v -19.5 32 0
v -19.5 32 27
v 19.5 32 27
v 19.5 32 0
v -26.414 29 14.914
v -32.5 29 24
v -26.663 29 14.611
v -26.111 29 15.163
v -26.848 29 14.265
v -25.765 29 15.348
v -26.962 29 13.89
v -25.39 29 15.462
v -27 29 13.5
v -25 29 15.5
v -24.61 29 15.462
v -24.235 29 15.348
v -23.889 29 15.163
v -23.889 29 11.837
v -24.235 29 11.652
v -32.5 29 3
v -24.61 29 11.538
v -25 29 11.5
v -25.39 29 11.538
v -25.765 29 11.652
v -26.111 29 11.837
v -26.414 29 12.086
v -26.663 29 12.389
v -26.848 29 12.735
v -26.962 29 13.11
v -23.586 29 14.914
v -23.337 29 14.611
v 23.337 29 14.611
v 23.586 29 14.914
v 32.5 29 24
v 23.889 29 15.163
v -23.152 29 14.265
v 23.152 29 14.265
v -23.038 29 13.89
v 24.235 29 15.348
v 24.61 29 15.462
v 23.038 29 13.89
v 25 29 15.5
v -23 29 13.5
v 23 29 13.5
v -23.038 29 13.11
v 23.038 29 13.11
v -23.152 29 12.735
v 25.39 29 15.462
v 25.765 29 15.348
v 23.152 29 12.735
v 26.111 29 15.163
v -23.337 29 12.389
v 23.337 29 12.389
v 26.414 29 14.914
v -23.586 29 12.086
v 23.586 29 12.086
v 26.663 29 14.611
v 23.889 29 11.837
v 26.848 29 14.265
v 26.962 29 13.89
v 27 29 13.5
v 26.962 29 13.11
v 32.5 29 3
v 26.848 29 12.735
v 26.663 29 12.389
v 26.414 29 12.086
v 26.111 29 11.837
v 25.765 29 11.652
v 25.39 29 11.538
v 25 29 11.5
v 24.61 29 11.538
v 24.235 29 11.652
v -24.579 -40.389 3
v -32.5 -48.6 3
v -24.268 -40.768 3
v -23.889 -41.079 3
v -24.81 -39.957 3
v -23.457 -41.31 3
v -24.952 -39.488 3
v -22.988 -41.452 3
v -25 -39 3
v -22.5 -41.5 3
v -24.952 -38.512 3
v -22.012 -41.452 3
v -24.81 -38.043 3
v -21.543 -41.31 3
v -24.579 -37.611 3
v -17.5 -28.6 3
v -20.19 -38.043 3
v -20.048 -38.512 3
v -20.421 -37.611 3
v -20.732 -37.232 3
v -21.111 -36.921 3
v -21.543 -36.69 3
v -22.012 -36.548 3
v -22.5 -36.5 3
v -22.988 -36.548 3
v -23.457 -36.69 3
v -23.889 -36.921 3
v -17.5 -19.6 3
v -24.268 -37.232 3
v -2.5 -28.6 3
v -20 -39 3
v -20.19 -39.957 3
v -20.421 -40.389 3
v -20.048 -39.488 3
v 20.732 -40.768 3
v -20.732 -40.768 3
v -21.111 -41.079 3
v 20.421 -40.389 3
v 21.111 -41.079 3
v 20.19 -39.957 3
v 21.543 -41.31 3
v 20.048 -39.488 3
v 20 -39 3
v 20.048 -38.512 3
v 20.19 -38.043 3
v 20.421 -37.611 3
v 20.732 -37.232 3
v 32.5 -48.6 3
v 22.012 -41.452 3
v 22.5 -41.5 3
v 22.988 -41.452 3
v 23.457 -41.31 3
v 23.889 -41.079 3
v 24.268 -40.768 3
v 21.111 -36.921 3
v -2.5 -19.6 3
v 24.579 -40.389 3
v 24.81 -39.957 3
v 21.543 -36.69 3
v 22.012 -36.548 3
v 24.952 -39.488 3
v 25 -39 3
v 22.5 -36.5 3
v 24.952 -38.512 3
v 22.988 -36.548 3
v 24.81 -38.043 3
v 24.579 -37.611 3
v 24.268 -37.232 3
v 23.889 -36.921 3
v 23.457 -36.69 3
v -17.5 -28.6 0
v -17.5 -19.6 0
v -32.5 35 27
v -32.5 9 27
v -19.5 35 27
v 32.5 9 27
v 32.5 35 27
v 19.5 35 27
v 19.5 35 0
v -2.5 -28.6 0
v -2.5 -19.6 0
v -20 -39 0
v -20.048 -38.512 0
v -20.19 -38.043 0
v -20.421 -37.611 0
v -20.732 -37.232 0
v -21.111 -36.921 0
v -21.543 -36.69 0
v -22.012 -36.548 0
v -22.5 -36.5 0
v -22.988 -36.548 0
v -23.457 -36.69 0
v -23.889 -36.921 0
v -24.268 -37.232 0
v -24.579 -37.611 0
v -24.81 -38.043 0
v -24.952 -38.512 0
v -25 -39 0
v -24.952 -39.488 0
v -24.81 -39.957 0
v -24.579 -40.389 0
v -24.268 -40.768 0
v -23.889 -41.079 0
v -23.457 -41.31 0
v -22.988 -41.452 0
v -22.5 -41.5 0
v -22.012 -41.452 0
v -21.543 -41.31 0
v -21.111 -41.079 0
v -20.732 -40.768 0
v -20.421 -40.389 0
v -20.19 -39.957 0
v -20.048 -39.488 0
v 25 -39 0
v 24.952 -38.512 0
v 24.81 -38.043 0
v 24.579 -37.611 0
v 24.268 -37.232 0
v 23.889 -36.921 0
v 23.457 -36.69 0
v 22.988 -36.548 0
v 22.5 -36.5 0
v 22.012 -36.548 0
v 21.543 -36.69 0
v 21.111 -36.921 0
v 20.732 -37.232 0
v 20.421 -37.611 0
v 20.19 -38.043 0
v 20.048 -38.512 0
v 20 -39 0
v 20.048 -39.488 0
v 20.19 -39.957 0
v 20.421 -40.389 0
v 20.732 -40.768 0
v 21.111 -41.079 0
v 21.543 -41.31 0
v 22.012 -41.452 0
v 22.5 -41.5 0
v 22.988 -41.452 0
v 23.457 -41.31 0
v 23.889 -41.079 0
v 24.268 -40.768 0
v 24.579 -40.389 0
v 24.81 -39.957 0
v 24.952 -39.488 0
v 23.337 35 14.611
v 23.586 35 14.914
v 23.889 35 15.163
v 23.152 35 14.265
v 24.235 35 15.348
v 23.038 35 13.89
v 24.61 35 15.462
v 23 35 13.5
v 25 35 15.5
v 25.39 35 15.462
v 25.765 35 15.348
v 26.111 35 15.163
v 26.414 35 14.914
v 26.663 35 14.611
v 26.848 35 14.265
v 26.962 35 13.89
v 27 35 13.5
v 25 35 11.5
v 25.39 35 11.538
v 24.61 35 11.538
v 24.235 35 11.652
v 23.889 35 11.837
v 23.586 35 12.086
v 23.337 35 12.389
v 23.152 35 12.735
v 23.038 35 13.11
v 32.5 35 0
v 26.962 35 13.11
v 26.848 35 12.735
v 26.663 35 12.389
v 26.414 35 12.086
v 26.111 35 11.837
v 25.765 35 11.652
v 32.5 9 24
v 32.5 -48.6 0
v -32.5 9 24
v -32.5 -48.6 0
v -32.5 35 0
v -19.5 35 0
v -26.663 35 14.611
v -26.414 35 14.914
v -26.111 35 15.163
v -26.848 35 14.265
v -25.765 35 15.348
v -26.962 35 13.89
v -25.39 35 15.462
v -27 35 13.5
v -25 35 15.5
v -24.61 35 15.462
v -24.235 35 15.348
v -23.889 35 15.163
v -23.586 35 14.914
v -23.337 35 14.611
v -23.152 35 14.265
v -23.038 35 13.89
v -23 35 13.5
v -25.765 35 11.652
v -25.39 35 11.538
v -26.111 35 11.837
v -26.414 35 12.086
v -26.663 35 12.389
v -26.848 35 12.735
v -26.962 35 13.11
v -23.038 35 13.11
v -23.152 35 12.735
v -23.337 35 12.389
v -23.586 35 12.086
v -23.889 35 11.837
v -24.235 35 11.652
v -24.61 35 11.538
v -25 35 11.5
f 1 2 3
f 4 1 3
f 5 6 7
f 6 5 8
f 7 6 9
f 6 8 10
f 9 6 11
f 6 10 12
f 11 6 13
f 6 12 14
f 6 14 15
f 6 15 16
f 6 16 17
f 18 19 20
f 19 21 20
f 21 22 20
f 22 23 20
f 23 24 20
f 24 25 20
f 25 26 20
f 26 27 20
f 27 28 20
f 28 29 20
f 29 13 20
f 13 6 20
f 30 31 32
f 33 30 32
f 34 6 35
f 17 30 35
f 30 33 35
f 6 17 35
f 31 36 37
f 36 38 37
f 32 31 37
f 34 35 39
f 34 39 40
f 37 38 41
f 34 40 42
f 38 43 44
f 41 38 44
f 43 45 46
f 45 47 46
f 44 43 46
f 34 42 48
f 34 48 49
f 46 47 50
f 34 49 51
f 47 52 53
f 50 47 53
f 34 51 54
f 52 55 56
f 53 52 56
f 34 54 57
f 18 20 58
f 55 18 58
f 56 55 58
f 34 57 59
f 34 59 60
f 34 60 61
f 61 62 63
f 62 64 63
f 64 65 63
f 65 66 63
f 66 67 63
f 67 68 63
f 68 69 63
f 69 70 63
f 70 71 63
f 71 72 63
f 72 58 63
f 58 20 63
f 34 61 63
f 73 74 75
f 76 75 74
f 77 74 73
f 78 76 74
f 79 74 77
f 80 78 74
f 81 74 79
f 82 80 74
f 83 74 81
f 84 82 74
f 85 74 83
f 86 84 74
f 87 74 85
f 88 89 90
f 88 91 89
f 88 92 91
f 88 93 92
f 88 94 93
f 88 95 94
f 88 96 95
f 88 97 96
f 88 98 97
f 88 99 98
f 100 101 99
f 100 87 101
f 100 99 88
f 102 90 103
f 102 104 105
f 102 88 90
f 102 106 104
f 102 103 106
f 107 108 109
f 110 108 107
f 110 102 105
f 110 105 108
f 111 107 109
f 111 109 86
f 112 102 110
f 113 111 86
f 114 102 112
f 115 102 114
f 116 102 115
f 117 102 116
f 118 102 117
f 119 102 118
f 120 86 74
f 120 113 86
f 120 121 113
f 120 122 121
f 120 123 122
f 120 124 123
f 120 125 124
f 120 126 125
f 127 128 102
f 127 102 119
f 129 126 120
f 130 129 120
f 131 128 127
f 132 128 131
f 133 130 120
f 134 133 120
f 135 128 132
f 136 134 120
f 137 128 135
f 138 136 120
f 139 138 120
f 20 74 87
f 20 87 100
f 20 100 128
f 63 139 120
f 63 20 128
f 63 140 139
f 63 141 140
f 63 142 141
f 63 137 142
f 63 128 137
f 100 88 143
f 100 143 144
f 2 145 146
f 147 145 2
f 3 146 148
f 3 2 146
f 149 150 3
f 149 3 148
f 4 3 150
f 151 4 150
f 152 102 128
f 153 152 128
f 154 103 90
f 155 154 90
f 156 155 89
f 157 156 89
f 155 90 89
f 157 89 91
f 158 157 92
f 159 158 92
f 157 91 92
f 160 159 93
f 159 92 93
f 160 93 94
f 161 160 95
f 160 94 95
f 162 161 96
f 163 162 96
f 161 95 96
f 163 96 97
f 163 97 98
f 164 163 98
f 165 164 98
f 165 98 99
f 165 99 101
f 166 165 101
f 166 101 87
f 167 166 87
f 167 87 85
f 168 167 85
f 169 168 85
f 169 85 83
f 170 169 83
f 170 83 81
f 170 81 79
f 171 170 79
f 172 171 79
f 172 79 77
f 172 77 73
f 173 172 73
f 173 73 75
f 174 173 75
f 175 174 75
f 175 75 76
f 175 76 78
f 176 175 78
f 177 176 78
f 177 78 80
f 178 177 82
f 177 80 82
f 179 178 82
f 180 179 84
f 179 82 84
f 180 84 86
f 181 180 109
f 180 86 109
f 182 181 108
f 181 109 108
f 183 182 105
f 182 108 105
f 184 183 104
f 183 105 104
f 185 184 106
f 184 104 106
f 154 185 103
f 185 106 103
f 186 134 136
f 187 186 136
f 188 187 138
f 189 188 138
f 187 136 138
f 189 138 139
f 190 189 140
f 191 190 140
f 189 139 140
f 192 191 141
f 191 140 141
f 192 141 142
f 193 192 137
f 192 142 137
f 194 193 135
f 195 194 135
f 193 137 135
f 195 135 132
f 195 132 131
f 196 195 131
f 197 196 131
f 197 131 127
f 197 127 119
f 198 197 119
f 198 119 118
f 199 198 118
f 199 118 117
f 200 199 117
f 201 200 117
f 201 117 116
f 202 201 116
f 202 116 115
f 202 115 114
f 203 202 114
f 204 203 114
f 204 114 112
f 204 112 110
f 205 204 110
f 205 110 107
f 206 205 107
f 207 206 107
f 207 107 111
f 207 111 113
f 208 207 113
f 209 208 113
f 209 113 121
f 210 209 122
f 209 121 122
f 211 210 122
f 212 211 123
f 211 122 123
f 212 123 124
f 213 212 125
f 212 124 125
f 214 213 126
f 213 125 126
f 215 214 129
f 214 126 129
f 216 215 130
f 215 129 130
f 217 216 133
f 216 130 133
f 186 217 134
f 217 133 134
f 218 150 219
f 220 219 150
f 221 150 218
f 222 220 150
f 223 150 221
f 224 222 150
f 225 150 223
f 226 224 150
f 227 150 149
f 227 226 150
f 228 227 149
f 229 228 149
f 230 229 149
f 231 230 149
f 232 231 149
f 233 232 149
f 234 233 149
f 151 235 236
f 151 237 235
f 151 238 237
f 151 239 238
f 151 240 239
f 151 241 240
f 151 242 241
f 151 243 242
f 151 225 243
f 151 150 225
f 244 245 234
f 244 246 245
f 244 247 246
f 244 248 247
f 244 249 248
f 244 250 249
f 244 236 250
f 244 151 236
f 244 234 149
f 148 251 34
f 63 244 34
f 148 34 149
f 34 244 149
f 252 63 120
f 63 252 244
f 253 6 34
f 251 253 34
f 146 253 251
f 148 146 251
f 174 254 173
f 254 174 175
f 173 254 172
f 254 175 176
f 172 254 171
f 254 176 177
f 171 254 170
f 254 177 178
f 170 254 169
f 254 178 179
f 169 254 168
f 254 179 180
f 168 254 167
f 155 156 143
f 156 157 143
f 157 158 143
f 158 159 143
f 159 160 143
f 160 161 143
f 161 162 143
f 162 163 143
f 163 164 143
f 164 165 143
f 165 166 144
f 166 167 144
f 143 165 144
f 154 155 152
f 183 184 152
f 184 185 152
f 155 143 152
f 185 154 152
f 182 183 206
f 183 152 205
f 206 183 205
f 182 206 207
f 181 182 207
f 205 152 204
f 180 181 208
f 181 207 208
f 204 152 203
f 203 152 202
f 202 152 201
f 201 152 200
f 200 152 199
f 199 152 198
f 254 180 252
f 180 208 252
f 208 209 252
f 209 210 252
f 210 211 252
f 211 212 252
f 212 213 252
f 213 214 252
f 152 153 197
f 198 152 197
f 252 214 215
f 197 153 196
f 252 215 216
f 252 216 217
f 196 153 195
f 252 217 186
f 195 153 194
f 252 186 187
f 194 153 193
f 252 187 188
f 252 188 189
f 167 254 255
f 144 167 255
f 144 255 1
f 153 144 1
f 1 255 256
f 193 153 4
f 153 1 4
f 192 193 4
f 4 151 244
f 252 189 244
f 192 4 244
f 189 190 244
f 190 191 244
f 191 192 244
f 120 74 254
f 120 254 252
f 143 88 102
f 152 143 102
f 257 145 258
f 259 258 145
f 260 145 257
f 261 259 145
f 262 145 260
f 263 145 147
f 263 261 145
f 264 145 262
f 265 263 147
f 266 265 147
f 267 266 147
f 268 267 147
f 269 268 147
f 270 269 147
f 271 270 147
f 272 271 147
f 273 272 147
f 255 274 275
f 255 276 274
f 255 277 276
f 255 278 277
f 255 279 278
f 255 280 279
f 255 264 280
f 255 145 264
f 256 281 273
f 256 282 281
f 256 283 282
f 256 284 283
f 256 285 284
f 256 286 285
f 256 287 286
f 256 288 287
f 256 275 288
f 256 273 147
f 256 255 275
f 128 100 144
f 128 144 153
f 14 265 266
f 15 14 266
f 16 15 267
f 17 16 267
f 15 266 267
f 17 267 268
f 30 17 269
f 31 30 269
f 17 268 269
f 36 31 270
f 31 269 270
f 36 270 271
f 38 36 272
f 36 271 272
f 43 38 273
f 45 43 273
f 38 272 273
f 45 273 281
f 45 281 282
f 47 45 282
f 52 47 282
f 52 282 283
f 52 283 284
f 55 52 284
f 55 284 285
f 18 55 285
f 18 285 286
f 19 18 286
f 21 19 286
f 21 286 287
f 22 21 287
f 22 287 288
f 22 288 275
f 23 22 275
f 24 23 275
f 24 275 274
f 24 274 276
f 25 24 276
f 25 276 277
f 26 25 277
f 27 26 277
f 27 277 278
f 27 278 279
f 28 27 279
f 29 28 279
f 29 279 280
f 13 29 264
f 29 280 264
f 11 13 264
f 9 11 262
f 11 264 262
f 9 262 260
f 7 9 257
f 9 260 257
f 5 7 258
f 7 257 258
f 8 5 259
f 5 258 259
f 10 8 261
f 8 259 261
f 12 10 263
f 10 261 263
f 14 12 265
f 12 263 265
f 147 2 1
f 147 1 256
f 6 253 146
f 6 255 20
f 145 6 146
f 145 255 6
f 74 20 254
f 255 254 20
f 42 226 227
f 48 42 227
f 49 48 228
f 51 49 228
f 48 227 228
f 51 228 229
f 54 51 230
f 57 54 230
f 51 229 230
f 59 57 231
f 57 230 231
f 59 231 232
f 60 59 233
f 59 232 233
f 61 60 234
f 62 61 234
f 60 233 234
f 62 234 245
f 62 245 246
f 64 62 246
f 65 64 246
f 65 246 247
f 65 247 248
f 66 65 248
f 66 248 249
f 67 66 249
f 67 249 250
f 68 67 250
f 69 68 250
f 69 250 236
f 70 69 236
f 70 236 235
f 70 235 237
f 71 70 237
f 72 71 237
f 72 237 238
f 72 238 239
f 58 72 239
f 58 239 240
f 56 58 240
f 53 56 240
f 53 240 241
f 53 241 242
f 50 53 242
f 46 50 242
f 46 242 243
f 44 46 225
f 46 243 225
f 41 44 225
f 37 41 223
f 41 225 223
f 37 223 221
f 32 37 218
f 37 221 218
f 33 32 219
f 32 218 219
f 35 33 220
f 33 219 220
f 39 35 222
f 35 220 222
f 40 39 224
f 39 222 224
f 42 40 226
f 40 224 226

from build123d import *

# Parameters (mm, degrees)
SKETCH_1_W          = 65
SKETCH_1_H          = 70
EXTRUDE_1_DEPTH     = 3
SKETCH_2_W          = 65
SKETCH_2_H          = 6
EXTRUDE_2_DEPTH     = 21
SKETCH_3_W          = 65
SKETCH_3_H          = 3
EXTRUDE_3_DEPTH     = 26
SKETCH_4_W          = 39
SKETCH_4_H          = 3
CUT_EXTRUDE_1_DEPTH = 55.865745233
SKETCH_5_R          = 2
CUT_EXTRUDE_2_DEPTH = 82.76337811
SKETCH_6_W          = 65
SKETCH_6_H          = 3
EXTRUDE_4_DEPTH     = 13.6
SKETCH_7_R          = 2.5
CUT_EXTRUDE_3_DEPTH = 64.199762658
SKETCH_8_W          = 15
SKETCH_8_H          = 9
CUT_EXTRUDE_4_DEPTH = 64.199762658


with BuildPart() as part:
    # 草图1 → 凸台-拉伸1 (new body)
    with BuildSketch(Plane.XY):
        Rectangle(SKETCH_1_W, SKETCH_1_H)
    extrude(amount=EXTRUDE_1_DEPTH)

    # 草图2 → 凸台-拉伸2 (add)
    with BuildSketch(Plane.XY.offset(3)):
        with Locations((0, 32)):
            Rectangle(SKETCH_2_W, SKETCH_2_H)
    extrude(amount=EXTRUDE_2_DEPTH)

    # 草图3 → 凸台-拉伸3 (add)
    with BuildSketch(Plane(origin=(0, 35, 0), x_dir=(1, 0, 0), z_dir=(0, 1, 0))):
        with Locations((0, -25.5)):
            Rectangle(SKETCH_3_W, SKETCH_3_H)
    extrude(amount=-EXTRUDE_3_DEPTH)

    # 草图4 → 切除-拉伸1 (cut, through all)
    with BuildSketch(Plane.XY.offset(27)):
        with Locations((0, 33.5)):
            Rectangle(SKETCH_4_W, SKETCH_4_H)
    extrude(amount=-CUT_EXTRUDE_1_DEPTH, mode=Mode.SUBTRACT)

    # 草图5 → 切除-拉伸2 (cut, through all)
    with BuildSketch(Plane(origin=(0, 35, 0), x_dir=(1, 0, 0), z_dir=(0, 1, 0))):
        with Locations(Location((-25, -13.5, 0), (0, 0, 270))):
            Circle(SKETCH_5_R)
        with Locations(Location((25, -13.5, 0), (0, 0, 270))):
            Circle(SKETCH_5_R)
    extrude(amount=-CUT_EXTRUDE_2_DEPTH, mode=Mode.SUBTRACT)

    # 草图6 → 凸台-拉伸4 (add)
    with BuildSketch(Plane.XZ.offset(35)):
        with Locations((0, 1.5)):
            Rectangle(SKETCH_6_W, SKETCH_6_H)
    extrude(amount=EXTRUDE_4_DEPTH)

    # 草图7 → 切除-拉伸3 (cut, through all)
    with BuildSketch(Plane.XY.offset(3)):
        with Locations((-22.5, -39)):
            Circle(SKETCH_7_R)
        with Locations((22.5, -39)):
            Circle(SKETCH_7_R)
    extrude(amount=-CUT_EXTRUDE_3_DEPTH, mode=Mode.SUBTRACT)

    # 草图8 → 切除-拉伸4 (cut, through all)
    with BuildSketch(Plane.XY.offset(3)):
        with Locations((-10, -24.1)):
            Rectangle(SKETCH_8_W, SKETCH_8_H)
    extrude(amount=-CUT_EXTRUDE_4_DEPTH, mode=Mode.SUBTRACT)


solid = part.part
